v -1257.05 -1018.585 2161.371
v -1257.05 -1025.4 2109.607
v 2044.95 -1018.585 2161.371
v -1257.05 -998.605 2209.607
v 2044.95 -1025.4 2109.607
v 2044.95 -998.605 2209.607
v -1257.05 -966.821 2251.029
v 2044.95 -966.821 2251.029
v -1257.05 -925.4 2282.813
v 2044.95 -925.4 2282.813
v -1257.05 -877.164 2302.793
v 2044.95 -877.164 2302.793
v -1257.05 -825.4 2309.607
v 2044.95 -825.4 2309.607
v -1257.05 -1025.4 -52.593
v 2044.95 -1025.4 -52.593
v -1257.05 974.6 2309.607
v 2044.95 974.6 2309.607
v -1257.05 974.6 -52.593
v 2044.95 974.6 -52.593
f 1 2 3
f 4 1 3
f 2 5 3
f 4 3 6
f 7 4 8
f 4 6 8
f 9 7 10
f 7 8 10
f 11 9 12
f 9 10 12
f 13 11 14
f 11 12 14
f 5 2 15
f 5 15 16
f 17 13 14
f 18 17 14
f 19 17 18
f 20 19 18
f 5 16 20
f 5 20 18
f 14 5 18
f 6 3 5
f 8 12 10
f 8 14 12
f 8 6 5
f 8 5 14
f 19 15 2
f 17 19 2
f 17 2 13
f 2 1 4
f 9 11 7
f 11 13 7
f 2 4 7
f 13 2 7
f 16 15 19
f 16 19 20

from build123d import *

# Parameters (mm, degrees)
F0_W     = 3302
F0_H     = 2362.2
F1_DEPTH = 25.4
F2_DEPTH = 1000
F3_R     = 200


with BuildPart() as f1:
    # F0 (on Front) → F1 (new body)
    with BuildSketch(Plane.XZ):
        with Locations((393.9499557018, 1128.5074533472)):
            Rectangle(F0_W, F0_H)
    extrude(amount=F1_DEPTH)

    # F2 (add, symmetric): a face of the model
    f2_faces = [f1.faces().sort_by_distance(p)[0] for p in [
        (393.9499557018, -25.4, 1128.5074533472),
    ]]
    extrude(f2_faces, amount=F2_DEPTH, both=True)

    # F3
    f3_edges = [f1.edges().sort_by_distance(p)[0] for p in [
        (393.949956, -1025.4, 2309.607453),
    ]]
    fillet(f3_edges, radius=F3_R)


solid = f1.part
